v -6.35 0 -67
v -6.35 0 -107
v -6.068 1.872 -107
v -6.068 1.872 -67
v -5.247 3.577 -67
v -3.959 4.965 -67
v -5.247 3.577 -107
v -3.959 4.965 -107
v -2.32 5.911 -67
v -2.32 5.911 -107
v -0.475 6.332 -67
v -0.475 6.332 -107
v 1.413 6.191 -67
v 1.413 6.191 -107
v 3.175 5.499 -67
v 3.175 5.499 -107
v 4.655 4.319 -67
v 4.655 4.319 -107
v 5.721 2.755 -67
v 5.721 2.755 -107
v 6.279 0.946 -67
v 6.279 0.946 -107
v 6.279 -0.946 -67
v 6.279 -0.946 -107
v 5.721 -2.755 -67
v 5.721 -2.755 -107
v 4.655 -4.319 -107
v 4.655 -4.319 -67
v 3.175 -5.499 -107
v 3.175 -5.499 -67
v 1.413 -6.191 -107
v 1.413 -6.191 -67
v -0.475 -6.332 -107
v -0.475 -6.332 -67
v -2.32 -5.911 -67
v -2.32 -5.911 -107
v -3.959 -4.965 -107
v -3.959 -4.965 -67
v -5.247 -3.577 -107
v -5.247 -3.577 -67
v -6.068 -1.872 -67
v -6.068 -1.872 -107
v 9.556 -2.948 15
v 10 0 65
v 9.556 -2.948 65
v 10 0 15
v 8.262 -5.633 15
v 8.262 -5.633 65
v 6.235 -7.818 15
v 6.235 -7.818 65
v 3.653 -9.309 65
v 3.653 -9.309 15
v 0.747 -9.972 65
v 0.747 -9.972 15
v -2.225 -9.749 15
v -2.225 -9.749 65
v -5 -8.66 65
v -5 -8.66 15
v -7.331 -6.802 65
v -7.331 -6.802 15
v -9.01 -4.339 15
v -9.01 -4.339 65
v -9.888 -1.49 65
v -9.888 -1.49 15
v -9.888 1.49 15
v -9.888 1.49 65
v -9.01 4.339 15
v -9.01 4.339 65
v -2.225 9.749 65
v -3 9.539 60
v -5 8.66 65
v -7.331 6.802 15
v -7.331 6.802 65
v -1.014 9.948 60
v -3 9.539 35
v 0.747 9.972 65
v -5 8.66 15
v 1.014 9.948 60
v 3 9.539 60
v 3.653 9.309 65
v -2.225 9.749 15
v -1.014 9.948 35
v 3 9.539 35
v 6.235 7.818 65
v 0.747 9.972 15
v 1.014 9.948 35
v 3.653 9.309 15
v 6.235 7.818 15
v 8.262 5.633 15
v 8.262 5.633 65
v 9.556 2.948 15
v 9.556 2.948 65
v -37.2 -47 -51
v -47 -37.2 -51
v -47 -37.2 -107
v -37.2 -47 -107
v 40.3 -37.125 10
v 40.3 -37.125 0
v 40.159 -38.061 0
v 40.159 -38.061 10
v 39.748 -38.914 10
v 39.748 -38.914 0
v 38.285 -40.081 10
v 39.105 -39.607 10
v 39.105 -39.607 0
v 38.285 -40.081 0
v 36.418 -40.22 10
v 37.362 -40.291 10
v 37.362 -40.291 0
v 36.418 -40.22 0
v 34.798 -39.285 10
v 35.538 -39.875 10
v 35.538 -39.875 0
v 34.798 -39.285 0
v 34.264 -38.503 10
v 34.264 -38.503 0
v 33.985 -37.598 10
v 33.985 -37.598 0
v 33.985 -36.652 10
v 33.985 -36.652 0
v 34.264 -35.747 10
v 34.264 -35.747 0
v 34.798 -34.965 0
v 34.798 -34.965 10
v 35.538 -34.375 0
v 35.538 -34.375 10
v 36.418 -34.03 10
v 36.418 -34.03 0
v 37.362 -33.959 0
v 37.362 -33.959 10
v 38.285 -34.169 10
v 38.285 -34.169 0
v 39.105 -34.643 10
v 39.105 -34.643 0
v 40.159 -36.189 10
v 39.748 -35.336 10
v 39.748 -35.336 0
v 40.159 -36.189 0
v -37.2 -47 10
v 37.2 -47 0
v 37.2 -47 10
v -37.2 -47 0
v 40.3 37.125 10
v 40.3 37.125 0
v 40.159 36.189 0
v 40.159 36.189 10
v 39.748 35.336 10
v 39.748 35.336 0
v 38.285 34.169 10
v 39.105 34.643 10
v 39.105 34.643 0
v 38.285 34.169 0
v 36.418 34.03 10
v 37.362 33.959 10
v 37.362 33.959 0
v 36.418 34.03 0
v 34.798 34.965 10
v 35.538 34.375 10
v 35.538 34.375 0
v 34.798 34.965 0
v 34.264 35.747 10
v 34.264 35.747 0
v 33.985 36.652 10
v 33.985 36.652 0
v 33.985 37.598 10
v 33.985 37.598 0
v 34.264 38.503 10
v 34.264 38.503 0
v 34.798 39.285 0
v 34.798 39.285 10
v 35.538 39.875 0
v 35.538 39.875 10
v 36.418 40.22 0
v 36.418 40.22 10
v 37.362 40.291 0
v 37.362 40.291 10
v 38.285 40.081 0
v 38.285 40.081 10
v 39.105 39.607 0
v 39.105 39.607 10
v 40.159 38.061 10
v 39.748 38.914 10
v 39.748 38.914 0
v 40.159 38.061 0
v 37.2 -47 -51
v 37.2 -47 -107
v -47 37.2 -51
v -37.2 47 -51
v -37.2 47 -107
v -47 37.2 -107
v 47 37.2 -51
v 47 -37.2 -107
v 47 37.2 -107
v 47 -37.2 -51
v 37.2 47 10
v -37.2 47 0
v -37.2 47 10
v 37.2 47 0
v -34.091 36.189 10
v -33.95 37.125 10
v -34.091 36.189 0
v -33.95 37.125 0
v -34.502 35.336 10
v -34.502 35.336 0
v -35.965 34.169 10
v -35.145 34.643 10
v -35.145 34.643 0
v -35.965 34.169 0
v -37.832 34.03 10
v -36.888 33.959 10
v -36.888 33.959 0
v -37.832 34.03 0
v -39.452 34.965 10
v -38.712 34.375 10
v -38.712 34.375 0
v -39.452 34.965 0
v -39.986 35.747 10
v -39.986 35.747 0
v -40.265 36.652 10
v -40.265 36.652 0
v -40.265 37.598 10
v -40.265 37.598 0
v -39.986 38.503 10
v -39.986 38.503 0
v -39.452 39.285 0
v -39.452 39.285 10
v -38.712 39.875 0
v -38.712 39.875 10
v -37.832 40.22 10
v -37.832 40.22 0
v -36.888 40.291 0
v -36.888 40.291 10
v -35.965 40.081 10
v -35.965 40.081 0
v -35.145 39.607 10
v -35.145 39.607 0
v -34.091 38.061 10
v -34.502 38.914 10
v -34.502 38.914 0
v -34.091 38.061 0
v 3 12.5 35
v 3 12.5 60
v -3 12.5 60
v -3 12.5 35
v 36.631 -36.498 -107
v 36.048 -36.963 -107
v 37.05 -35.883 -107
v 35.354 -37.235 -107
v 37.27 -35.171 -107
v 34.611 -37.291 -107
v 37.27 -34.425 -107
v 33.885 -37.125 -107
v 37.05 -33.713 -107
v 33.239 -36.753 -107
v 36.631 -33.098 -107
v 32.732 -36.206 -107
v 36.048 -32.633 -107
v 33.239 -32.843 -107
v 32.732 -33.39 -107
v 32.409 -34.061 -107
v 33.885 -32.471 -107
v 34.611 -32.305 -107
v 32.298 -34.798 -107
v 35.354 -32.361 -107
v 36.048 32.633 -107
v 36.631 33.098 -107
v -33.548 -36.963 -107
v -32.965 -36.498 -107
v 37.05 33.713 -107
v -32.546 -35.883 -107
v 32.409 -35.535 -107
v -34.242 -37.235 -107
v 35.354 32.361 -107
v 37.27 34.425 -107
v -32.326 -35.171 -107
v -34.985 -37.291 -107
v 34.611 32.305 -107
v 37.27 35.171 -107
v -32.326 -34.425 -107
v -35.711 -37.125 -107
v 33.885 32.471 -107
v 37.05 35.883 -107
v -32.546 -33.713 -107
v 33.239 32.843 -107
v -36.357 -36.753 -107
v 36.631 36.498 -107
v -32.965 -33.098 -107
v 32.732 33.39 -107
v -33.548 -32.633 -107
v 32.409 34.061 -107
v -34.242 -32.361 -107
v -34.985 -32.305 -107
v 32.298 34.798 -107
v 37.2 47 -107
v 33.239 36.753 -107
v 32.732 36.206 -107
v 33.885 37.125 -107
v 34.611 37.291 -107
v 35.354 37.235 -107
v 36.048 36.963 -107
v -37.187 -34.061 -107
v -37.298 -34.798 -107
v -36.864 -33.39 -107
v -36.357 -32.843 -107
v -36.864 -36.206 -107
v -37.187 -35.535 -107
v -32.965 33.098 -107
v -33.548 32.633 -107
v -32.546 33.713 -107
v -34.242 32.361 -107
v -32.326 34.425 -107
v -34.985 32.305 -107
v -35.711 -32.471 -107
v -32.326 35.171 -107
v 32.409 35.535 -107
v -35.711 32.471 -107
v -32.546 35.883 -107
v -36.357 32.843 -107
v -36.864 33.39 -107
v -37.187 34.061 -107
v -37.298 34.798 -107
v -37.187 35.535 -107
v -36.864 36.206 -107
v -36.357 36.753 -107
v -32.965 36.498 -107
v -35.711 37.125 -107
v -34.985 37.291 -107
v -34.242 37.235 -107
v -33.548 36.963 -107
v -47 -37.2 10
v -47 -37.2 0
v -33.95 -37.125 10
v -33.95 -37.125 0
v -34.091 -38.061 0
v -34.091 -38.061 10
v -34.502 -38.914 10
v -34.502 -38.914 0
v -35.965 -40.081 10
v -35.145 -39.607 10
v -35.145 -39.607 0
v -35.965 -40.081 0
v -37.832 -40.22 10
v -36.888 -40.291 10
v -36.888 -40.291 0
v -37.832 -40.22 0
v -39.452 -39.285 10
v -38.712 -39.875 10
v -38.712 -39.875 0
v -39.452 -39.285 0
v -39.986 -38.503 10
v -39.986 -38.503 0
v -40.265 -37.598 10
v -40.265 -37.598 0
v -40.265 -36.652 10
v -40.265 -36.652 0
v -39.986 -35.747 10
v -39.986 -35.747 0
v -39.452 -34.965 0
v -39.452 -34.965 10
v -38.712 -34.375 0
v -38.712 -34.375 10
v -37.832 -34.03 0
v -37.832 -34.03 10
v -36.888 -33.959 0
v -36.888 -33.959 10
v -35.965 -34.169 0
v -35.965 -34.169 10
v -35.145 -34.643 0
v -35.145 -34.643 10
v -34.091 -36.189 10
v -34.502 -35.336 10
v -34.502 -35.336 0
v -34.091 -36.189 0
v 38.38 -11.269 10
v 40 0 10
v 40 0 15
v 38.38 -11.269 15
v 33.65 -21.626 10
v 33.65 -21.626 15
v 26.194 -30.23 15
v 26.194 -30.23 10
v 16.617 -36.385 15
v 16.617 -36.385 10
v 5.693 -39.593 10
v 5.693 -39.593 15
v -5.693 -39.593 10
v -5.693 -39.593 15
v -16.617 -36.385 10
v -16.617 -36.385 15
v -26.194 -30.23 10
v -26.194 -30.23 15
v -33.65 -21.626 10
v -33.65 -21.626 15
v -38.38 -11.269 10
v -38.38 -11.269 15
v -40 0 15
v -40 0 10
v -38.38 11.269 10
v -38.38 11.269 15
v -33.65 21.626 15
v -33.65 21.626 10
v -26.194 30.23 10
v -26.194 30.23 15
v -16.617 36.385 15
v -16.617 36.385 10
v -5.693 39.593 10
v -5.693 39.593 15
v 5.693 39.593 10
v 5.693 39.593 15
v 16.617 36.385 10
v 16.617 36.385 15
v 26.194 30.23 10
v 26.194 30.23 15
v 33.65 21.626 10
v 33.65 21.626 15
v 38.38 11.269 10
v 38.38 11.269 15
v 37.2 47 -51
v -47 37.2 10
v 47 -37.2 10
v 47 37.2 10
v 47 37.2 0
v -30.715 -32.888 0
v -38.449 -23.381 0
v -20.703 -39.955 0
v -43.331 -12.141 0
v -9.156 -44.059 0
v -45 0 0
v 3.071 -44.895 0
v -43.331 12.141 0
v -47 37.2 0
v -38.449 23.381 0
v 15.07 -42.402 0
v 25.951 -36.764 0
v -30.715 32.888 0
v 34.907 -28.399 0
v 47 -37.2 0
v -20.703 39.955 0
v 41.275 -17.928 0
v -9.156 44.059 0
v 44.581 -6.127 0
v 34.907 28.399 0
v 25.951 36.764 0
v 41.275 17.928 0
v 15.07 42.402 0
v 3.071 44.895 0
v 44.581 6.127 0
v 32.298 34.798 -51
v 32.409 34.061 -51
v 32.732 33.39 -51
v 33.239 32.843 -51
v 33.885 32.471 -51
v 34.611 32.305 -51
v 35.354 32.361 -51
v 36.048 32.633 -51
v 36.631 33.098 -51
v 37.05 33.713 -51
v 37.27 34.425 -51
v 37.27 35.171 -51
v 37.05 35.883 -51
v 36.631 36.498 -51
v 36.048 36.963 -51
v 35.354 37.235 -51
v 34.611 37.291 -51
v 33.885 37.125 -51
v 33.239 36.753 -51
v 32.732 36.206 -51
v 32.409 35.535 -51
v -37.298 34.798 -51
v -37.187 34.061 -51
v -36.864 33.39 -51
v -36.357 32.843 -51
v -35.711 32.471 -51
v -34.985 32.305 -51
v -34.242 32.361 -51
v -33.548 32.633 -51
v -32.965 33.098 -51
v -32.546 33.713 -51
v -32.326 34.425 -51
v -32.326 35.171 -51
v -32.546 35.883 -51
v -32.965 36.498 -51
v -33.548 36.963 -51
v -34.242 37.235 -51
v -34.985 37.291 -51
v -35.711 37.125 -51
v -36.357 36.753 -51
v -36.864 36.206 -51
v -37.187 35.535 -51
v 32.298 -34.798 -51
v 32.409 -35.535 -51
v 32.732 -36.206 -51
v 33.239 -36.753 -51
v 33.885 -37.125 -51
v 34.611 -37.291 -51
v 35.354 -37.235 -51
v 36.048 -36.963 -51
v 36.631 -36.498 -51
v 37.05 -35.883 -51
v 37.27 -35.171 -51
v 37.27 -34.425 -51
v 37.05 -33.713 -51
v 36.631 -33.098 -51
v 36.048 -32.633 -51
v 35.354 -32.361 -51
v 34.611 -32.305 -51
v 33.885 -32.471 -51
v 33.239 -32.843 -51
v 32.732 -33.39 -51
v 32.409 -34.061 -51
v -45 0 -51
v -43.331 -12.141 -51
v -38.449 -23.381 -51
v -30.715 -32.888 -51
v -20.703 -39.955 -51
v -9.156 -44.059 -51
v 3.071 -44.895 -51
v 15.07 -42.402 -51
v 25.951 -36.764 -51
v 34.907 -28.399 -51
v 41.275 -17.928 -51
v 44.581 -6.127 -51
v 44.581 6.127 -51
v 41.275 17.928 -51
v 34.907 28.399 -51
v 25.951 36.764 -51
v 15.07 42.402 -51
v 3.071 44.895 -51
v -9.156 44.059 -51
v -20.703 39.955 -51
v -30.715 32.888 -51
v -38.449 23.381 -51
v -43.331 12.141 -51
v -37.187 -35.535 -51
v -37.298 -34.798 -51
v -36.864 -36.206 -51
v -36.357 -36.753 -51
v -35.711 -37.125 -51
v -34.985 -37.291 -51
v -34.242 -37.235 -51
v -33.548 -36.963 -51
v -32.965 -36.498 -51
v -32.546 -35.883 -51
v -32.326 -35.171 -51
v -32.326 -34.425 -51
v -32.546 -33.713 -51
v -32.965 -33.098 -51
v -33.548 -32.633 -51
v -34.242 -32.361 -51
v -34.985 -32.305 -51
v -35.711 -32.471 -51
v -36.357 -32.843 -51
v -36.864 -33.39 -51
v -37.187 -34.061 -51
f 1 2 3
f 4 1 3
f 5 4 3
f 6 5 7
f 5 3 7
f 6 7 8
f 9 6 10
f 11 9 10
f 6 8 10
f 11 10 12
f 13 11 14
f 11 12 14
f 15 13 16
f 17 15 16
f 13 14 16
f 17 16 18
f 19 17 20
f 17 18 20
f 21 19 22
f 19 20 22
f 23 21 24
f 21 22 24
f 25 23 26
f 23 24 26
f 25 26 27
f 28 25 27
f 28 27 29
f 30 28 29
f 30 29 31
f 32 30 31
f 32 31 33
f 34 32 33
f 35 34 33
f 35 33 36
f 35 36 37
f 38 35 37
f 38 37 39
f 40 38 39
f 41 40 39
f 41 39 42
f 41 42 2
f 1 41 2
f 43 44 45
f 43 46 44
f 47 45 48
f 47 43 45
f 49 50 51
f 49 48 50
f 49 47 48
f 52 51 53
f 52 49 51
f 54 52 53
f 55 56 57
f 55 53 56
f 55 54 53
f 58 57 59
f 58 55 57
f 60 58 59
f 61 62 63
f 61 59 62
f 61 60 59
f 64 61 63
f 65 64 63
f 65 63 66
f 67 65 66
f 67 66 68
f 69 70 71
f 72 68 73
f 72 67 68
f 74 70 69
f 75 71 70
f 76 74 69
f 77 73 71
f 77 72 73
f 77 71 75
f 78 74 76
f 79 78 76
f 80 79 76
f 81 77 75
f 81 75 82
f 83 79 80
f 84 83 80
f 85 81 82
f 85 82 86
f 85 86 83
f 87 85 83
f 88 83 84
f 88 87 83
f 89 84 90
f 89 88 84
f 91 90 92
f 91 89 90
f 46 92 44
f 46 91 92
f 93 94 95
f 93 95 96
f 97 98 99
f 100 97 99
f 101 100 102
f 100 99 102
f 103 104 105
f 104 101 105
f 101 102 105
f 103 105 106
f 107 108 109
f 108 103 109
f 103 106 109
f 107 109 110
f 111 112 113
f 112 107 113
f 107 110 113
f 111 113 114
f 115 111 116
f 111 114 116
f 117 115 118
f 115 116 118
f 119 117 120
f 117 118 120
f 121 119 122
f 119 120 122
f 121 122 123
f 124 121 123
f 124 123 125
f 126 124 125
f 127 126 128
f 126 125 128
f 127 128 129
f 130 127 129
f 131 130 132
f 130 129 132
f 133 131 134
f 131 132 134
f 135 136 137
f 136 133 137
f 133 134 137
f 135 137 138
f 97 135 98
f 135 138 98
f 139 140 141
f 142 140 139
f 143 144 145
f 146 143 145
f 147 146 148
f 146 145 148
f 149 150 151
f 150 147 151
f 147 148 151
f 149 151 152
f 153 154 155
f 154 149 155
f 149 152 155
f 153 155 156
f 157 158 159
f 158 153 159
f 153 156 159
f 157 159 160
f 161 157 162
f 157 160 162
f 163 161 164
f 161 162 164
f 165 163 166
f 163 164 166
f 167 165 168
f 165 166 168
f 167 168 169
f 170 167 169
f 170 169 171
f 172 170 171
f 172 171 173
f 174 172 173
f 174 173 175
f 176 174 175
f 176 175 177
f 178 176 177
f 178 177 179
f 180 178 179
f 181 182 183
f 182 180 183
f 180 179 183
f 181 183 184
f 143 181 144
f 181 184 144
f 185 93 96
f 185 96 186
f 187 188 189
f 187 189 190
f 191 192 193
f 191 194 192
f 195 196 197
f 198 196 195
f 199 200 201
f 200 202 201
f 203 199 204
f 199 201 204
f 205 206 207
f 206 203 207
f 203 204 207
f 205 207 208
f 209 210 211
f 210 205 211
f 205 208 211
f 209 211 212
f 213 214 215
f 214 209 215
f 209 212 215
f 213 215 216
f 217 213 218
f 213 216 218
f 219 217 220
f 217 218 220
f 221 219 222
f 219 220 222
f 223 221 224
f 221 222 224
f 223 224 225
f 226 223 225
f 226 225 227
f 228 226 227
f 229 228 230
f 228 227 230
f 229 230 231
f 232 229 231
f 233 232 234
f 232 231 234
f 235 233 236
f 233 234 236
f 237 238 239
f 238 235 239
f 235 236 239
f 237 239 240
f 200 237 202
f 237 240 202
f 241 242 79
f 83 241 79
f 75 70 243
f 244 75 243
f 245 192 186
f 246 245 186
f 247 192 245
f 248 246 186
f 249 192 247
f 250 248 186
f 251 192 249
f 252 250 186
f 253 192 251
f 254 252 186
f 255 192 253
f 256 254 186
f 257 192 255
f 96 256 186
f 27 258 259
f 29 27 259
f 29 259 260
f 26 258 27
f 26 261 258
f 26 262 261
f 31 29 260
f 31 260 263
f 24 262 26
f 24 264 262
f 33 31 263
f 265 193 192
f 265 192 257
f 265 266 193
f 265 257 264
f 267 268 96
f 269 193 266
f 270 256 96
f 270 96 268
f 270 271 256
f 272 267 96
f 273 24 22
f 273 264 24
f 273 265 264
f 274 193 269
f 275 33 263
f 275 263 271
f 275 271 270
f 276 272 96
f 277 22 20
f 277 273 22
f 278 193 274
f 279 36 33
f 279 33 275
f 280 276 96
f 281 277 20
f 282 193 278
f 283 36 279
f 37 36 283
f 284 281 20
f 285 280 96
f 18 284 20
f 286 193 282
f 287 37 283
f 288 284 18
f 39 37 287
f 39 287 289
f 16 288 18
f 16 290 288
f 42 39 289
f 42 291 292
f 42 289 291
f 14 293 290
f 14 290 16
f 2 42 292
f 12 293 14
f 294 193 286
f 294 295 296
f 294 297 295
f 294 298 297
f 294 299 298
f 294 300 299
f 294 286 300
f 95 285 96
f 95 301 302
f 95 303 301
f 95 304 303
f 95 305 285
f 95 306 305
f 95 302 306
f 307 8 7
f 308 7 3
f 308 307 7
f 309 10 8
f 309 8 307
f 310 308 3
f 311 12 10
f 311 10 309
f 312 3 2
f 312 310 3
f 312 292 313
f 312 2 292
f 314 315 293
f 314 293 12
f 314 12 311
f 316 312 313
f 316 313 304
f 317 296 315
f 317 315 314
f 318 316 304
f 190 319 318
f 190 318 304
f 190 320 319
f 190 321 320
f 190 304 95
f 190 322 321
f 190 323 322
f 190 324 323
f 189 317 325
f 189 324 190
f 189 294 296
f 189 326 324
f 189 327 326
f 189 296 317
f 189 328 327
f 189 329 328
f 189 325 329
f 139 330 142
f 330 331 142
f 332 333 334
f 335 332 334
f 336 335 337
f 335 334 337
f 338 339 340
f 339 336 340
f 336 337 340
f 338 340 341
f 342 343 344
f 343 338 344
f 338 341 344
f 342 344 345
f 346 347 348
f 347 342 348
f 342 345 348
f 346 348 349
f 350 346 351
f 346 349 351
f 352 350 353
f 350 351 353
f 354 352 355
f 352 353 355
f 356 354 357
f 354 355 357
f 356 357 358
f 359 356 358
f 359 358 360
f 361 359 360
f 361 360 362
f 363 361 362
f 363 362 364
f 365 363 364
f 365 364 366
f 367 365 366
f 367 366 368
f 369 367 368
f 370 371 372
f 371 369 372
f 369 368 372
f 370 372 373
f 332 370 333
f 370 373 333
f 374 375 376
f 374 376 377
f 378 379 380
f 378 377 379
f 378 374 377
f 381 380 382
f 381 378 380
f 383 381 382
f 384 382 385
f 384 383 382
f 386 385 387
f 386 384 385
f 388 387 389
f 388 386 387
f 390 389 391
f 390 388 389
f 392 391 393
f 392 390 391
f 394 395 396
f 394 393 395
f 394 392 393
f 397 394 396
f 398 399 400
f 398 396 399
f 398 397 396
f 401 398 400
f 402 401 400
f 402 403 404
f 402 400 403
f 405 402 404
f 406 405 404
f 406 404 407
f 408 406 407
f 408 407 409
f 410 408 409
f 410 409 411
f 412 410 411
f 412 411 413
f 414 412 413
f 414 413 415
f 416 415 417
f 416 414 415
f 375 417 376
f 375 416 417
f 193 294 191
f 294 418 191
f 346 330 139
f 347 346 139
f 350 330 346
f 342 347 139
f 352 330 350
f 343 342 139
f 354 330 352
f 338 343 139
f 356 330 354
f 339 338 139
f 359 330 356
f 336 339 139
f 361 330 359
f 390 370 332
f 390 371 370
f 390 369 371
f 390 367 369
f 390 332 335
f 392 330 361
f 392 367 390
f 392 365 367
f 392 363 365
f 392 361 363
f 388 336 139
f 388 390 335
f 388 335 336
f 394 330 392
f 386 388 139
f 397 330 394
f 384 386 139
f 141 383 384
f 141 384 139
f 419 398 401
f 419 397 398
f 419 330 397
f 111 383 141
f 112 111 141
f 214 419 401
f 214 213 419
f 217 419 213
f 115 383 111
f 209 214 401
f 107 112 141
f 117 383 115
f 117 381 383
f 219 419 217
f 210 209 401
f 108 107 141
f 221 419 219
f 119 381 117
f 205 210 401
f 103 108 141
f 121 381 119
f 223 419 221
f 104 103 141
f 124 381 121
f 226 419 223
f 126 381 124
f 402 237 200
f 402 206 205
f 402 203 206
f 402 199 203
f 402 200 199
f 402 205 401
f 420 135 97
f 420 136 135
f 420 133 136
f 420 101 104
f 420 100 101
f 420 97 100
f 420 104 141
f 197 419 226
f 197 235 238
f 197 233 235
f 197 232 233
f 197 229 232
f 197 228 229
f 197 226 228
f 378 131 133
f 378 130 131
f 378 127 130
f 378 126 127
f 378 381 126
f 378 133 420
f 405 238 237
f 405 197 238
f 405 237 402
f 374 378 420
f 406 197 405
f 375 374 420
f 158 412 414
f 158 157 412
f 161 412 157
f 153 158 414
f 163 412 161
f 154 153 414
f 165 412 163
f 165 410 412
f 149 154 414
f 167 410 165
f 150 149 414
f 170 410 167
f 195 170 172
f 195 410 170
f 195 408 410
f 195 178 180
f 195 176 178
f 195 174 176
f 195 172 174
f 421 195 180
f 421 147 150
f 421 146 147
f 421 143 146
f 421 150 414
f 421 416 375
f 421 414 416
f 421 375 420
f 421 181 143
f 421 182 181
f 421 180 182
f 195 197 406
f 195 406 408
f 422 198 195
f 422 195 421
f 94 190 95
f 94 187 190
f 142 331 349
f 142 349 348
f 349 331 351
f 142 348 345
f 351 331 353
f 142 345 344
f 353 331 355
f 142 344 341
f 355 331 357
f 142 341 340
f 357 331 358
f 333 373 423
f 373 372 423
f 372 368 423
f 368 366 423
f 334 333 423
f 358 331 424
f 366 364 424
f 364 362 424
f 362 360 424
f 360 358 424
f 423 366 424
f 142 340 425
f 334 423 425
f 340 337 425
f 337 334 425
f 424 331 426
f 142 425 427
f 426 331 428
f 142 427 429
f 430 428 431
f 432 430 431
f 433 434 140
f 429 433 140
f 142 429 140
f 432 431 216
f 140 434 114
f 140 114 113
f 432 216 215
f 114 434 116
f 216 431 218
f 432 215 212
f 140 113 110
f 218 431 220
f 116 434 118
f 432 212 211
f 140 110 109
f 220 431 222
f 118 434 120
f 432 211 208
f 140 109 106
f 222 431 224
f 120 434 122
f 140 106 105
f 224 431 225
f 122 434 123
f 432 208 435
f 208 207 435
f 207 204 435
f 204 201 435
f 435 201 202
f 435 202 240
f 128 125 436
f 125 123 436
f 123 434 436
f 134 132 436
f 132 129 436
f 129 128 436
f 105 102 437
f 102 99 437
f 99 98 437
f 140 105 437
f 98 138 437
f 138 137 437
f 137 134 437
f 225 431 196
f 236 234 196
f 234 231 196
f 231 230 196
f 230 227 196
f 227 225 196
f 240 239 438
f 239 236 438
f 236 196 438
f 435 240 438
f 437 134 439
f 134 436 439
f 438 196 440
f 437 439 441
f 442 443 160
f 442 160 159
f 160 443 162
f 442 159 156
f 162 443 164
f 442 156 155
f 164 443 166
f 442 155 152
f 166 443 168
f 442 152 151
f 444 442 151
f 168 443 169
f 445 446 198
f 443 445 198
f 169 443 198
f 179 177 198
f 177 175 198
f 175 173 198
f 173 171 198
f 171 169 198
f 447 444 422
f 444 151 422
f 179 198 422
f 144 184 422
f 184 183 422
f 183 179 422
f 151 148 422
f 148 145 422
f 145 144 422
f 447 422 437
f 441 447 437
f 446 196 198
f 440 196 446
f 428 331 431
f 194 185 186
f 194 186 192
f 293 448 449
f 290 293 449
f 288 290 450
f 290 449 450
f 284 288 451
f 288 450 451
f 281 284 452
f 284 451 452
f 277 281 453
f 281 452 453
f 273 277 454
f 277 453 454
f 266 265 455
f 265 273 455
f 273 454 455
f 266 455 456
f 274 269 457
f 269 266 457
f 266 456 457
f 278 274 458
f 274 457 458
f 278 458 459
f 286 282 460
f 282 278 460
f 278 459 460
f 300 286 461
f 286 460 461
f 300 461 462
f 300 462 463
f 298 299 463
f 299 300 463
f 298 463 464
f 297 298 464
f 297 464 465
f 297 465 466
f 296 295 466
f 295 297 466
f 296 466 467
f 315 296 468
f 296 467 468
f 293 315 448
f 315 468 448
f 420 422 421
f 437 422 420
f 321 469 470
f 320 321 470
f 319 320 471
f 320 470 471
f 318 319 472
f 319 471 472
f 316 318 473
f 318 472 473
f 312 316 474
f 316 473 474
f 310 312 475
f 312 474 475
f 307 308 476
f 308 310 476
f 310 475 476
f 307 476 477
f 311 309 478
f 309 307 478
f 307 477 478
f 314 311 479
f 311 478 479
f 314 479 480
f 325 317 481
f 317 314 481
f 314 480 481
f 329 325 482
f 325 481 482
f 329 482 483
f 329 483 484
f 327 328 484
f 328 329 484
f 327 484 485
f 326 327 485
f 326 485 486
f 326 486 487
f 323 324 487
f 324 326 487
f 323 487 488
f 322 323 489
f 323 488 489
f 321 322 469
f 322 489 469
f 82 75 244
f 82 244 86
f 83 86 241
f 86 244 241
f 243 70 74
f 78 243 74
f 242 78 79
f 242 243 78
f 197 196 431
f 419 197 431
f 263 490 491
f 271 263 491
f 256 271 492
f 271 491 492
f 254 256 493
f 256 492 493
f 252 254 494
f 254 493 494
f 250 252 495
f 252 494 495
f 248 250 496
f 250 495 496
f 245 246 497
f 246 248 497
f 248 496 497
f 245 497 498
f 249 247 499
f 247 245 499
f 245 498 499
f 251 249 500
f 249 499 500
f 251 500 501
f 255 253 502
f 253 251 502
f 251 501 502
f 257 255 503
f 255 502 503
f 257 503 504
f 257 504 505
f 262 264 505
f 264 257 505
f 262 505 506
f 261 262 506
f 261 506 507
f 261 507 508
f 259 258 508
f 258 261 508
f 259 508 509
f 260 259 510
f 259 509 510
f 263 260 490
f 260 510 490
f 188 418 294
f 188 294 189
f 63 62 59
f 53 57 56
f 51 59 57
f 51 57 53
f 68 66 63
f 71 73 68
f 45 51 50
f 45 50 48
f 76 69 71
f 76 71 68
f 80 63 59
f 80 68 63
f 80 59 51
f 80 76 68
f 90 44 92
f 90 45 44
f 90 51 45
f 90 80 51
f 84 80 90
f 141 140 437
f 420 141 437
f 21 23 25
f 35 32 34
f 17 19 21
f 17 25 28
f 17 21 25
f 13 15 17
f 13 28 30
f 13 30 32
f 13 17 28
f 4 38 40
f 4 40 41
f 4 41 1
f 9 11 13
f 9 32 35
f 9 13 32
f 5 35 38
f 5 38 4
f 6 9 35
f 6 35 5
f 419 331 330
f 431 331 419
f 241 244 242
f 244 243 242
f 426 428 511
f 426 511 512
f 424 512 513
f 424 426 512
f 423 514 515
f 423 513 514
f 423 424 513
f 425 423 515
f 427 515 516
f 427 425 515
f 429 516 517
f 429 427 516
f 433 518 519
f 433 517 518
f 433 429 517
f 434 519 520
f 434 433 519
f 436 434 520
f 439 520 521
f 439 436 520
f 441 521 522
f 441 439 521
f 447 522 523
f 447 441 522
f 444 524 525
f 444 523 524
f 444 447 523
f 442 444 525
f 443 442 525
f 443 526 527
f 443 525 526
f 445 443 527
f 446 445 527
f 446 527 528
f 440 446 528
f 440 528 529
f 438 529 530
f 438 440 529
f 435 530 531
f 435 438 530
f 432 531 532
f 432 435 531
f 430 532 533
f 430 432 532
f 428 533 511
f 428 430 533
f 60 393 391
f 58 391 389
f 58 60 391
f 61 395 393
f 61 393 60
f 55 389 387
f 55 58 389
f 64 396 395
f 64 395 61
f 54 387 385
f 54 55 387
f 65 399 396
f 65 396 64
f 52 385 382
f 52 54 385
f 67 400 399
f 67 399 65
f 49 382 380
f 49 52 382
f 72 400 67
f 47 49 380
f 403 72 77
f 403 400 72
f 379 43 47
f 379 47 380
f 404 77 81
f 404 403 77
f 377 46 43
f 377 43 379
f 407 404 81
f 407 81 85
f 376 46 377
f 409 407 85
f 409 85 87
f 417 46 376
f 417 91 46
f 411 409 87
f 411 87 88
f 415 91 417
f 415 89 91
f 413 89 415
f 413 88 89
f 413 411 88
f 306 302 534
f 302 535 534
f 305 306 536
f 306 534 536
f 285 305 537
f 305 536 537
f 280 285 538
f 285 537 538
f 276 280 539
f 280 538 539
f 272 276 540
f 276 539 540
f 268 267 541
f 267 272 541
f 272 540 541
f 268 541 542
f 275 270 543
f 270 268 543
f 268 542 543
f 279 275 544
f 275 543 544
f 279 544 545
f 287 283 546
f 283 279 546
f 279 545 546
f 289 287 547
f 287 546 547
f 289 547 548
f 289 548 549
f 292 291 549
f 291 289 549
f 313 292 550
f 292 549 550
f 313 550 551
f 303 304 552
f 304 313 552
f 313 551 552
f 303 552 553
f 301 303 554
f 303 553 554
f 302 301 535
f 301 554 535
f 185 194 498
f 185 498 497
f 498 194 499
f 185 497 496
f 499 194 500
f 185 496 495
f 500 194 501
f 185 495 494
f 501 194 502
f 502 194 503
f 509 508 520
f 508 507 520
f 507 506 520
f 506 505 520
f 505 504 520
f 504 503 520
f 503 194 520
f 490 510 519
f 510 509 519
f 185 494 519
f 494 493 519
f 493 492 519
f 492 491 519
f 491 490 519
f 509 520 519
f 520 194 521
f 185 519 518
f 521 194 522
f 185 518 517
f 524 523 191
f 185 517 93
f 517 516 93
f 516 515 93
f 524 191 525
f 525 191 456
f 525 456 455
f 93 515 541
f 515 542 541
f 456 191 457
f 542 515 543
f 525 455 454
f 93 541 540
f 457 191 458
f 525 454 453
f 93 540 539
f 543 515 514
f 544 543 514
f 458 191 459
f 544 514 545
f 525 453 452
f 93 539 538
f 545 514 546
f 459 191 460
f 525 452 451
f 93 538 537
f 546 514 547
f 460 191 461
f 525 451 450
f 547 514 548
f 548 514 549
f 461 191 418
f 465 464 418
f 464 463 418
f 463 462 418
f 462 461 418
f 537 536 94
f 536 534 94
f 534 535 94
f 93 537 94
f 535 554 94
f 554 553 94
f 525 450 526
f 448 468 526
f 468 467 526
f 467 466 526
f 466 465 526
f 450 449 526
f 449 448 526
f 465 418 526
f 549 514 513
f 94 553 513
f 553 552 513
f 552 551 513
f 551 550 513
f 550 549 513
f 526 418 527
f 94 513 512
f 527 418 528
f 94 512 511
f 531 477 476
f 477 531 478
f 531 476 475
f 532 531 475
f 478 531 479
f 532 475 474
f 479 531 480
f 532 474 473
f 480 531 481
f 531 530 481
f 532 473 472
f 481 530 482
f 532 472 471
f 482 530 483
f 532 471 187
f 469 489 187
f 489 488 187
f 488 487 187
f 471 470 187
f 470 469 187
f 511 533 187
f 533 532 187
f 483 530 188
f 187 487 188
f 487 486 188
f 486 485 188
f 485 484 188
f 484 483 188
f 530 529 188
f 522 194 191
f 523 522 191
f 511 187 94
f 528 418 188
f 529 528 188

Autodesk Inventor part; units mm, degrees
ref_plane "YZ Plane" through (0, 0, 0) normal (1, 0, 0) x (0, 1, 0)
ref_plane "XZ Plane" through (0, 0, 0) normal (0, 1, 0) x (-1, 0, 0)
sketch "Sketch1" plane through (0, 0, 0) normal (0, 0, 1) x (1, 0, 0)
  line L0 (-37.2, 47) -> (37.2, 47)
  line L1 (47, 37.2) -> (47, -37.2)
  line L2 (37.2, -47) -> (-37.2, -47)
  line L3 (-47, -37.2) -> (-47, 37.2)
  circle A0 centre (0, 0) radius 52.5 construction
  line L4 (-37.125, 58) -> (-37.125, -64) construction
  line L5 (37.125, 58) -> (37.125, -64) construction
  line L6 (-69, 37.125) -> (85, 37.125) construction
  line L7 (-58, -37.125) -> (77, -37.125) construction
  circle A1 centre (-37.125, 37.125) radius 3.175
  circle A2 centre (37.125, 37.125) radius 3.175
  circle A3 centre (37.125, -37.125) radius 3.175
  circle A4 centre (-37.125, -37.125) radius 3.175
  line L8 (-37.2, 47) -> (-47, 37.2)
  line L9 (37.2, 47) -> (47, 37.2)
  line L10 (-47, -37.2) -> (-37.2, -47)
  line L11 (37.2, -47) -> (47, -37.2)
  point P0 (-47, 47)
  point P1 (47, -47)
  point P2 (47, 47)
  point P3 (-47, -47)
  dimension "d0" = 94
  dimension "d1" = 47
  dimension "d2" = 47
  dimension "d3" = 105
  dimension "d4" = 74.25
  dimension "d5" = 37.125
  dimension "d6" = 74.25
  dimension "d7" = 37.125
  dimension "d8" = 6.35
  dimension "d9" = 6.35
  dimension "d10" = 6.35
  dimension "d11" = 6.35
  dimension "d12" = 9.8
  dimension "d13" = 9.8
  dimension "d14" = 9.8
  dimension "d15" = 9.8
  dimension "d16" = 9.8
  dimension "d17" = 9.8
  dimension "d18" = 9.8
  dimension "d19" = 9.8
extrude "Extrusion1" add sketch "Sketch1" along normal blind 10
sketch "Sketch2" plane through (0, 0, 10) normal (0, 0, 1) x (1, 0, 0)
  circle A0 centre (0, 0) radius 40
  dimension "d22" = 80
extrude "Extrusion2" add sketch "Sketch2" along normal blind 5
sketch "Sketch3" plane through (0, 0, 15) normal (0, 0, 1) x (1, 0, 0)
  circle A0 centre (0, 0) radius 10
  dimension "d25" = 20
extrude "Extrusion3" add sketch "Sketch3" along normal blind 50
ref_plane "Work Plane1" through (0, 0, 60) normal (0, 0, 1) x (1, 0, 0)
sketch "Sketch5" plane through (0, 0, 60) normal (0, 0, 1) x (1, 0, 0)
  line L0 (-3, 12.5) -> (3, 12.5)
  line L1 (3, 12.5) -> (3, 7.2)
  line L2 (3, 7.2) -> (-3, 7.2)
  line L3 (-3, 7.2) -> (-3, 12.5)
  point P0 (0, 0)
  dimension "d29" = 6
  dimension "d30" = 3
  dimension "d31" = 12.5
extrude "Extrusion4" add sketch "Sketch5" against normal blind 25
sketch "Sketch6" plane through (0, 0, 0) normal (0, 0, -1) x (-1, 0, 0)
  circle A0 centre (0, 0) radius 45
  dimension "d34" = 90
extrude "Extrusion5" add sketch "Sketch6" along normal blind 51
sketch "Sketch8" plane through (0, 0, -51) normal (0, 0, -1) x (-1, 0, 0)
  line L0 (-37.2, 47) -> (37.2, 47)
  line L1 (47, 37.2) -> (47, -37.2)
  line L2 (37.2, -47) -> (-37.2, -47)
  line L3 (-47, -37.2) -> (-47, 37.2)
  line L4 (-37.2, 47) -> (37.2, 47) projected
  line L5 (47, 37.2) -> (47, -37.2) projected
  line L6 (37.2, -47) -> (-37.2, -47) projected
  line L7 (-47, -37.2) -> (-47, 37.2) projected
  circle A0 centre (-34.798, 34.798) radius 2.5
  circle A1 centre (34.798, 34.798) radius 2.5
  circle A2 centre (34.798, -34.798) radius 2.5
  circle A3 centre (-34.798, -34.798) radius 2.5
  line L8 (-37.2, 47) -> (-47, 37.2)
  line L9 (37.2, 47) -> (47, 37.2)
  line L10 (47, -37.2) -> (37.2, -47)
  line L11 (-37.2, -47) -> (-47, -37.2)
  point P0 (0, 0)
  point P1 (-47, 47)
  point P2 (47, -47)
  point P3 (47, 47)
  point P4 (-47, -47)
  dimension "d38" = 5
  dimension "d39" = 5
  dimension "d40" = 5
  dimension "d41" = 5
  dimension "d42" = 69.596
  dimension "d43" = 69.596
  dimension "d44" = 69.596
  dimension "d45" = 69.596
  dimension "d46" = 34.798
  dimension "d47" = 34.798
  dimension "d48" = 34.798
  dimension "d49" = 34.798
  dimension "d50" = 9.8
  dimension "d51" = 9.8
  dimension "d52" = 9.8
  dimension "d53" = 9.8
  dimension "d54" = 9.8
  dimension "d55" = 9.8
  dimension "d56" = 9.8
  dimension "d57" = 9.8
extrude "Extrusion6" add sketch "Sketch8" along normal blind 56
sketch "Sketch9" plane through (0, 0, -107) normal (0, 0, -1) x (-1, 0, 0)
  circle A0 centre (0, 0) radius 6.35
  dimension "d60" = 12.7
extrude "Extrusion7" cut sketch "Sketch9" against normal blind 40
equation "\"d13\" = d12"
equation "\"d14\" = d12"
equation "\"d15\" = d14"
equation "\"d16\" = d12"
equation "\"d17\" = d16"
equation "\"d18\" = d12"
equation "\"d19\" = d18"
equation "\"d51\" = d50"
equation "\"d52\" = d50"
equation "\"d53\" = d52"
equation "\"d54\" = d50"
equation "\"d55\" = d54"
equation "\"d56\" = d50"
equation "\"d57\" = d56"
properties part number "1224a_Stepper Motor Gearbox_V1"
